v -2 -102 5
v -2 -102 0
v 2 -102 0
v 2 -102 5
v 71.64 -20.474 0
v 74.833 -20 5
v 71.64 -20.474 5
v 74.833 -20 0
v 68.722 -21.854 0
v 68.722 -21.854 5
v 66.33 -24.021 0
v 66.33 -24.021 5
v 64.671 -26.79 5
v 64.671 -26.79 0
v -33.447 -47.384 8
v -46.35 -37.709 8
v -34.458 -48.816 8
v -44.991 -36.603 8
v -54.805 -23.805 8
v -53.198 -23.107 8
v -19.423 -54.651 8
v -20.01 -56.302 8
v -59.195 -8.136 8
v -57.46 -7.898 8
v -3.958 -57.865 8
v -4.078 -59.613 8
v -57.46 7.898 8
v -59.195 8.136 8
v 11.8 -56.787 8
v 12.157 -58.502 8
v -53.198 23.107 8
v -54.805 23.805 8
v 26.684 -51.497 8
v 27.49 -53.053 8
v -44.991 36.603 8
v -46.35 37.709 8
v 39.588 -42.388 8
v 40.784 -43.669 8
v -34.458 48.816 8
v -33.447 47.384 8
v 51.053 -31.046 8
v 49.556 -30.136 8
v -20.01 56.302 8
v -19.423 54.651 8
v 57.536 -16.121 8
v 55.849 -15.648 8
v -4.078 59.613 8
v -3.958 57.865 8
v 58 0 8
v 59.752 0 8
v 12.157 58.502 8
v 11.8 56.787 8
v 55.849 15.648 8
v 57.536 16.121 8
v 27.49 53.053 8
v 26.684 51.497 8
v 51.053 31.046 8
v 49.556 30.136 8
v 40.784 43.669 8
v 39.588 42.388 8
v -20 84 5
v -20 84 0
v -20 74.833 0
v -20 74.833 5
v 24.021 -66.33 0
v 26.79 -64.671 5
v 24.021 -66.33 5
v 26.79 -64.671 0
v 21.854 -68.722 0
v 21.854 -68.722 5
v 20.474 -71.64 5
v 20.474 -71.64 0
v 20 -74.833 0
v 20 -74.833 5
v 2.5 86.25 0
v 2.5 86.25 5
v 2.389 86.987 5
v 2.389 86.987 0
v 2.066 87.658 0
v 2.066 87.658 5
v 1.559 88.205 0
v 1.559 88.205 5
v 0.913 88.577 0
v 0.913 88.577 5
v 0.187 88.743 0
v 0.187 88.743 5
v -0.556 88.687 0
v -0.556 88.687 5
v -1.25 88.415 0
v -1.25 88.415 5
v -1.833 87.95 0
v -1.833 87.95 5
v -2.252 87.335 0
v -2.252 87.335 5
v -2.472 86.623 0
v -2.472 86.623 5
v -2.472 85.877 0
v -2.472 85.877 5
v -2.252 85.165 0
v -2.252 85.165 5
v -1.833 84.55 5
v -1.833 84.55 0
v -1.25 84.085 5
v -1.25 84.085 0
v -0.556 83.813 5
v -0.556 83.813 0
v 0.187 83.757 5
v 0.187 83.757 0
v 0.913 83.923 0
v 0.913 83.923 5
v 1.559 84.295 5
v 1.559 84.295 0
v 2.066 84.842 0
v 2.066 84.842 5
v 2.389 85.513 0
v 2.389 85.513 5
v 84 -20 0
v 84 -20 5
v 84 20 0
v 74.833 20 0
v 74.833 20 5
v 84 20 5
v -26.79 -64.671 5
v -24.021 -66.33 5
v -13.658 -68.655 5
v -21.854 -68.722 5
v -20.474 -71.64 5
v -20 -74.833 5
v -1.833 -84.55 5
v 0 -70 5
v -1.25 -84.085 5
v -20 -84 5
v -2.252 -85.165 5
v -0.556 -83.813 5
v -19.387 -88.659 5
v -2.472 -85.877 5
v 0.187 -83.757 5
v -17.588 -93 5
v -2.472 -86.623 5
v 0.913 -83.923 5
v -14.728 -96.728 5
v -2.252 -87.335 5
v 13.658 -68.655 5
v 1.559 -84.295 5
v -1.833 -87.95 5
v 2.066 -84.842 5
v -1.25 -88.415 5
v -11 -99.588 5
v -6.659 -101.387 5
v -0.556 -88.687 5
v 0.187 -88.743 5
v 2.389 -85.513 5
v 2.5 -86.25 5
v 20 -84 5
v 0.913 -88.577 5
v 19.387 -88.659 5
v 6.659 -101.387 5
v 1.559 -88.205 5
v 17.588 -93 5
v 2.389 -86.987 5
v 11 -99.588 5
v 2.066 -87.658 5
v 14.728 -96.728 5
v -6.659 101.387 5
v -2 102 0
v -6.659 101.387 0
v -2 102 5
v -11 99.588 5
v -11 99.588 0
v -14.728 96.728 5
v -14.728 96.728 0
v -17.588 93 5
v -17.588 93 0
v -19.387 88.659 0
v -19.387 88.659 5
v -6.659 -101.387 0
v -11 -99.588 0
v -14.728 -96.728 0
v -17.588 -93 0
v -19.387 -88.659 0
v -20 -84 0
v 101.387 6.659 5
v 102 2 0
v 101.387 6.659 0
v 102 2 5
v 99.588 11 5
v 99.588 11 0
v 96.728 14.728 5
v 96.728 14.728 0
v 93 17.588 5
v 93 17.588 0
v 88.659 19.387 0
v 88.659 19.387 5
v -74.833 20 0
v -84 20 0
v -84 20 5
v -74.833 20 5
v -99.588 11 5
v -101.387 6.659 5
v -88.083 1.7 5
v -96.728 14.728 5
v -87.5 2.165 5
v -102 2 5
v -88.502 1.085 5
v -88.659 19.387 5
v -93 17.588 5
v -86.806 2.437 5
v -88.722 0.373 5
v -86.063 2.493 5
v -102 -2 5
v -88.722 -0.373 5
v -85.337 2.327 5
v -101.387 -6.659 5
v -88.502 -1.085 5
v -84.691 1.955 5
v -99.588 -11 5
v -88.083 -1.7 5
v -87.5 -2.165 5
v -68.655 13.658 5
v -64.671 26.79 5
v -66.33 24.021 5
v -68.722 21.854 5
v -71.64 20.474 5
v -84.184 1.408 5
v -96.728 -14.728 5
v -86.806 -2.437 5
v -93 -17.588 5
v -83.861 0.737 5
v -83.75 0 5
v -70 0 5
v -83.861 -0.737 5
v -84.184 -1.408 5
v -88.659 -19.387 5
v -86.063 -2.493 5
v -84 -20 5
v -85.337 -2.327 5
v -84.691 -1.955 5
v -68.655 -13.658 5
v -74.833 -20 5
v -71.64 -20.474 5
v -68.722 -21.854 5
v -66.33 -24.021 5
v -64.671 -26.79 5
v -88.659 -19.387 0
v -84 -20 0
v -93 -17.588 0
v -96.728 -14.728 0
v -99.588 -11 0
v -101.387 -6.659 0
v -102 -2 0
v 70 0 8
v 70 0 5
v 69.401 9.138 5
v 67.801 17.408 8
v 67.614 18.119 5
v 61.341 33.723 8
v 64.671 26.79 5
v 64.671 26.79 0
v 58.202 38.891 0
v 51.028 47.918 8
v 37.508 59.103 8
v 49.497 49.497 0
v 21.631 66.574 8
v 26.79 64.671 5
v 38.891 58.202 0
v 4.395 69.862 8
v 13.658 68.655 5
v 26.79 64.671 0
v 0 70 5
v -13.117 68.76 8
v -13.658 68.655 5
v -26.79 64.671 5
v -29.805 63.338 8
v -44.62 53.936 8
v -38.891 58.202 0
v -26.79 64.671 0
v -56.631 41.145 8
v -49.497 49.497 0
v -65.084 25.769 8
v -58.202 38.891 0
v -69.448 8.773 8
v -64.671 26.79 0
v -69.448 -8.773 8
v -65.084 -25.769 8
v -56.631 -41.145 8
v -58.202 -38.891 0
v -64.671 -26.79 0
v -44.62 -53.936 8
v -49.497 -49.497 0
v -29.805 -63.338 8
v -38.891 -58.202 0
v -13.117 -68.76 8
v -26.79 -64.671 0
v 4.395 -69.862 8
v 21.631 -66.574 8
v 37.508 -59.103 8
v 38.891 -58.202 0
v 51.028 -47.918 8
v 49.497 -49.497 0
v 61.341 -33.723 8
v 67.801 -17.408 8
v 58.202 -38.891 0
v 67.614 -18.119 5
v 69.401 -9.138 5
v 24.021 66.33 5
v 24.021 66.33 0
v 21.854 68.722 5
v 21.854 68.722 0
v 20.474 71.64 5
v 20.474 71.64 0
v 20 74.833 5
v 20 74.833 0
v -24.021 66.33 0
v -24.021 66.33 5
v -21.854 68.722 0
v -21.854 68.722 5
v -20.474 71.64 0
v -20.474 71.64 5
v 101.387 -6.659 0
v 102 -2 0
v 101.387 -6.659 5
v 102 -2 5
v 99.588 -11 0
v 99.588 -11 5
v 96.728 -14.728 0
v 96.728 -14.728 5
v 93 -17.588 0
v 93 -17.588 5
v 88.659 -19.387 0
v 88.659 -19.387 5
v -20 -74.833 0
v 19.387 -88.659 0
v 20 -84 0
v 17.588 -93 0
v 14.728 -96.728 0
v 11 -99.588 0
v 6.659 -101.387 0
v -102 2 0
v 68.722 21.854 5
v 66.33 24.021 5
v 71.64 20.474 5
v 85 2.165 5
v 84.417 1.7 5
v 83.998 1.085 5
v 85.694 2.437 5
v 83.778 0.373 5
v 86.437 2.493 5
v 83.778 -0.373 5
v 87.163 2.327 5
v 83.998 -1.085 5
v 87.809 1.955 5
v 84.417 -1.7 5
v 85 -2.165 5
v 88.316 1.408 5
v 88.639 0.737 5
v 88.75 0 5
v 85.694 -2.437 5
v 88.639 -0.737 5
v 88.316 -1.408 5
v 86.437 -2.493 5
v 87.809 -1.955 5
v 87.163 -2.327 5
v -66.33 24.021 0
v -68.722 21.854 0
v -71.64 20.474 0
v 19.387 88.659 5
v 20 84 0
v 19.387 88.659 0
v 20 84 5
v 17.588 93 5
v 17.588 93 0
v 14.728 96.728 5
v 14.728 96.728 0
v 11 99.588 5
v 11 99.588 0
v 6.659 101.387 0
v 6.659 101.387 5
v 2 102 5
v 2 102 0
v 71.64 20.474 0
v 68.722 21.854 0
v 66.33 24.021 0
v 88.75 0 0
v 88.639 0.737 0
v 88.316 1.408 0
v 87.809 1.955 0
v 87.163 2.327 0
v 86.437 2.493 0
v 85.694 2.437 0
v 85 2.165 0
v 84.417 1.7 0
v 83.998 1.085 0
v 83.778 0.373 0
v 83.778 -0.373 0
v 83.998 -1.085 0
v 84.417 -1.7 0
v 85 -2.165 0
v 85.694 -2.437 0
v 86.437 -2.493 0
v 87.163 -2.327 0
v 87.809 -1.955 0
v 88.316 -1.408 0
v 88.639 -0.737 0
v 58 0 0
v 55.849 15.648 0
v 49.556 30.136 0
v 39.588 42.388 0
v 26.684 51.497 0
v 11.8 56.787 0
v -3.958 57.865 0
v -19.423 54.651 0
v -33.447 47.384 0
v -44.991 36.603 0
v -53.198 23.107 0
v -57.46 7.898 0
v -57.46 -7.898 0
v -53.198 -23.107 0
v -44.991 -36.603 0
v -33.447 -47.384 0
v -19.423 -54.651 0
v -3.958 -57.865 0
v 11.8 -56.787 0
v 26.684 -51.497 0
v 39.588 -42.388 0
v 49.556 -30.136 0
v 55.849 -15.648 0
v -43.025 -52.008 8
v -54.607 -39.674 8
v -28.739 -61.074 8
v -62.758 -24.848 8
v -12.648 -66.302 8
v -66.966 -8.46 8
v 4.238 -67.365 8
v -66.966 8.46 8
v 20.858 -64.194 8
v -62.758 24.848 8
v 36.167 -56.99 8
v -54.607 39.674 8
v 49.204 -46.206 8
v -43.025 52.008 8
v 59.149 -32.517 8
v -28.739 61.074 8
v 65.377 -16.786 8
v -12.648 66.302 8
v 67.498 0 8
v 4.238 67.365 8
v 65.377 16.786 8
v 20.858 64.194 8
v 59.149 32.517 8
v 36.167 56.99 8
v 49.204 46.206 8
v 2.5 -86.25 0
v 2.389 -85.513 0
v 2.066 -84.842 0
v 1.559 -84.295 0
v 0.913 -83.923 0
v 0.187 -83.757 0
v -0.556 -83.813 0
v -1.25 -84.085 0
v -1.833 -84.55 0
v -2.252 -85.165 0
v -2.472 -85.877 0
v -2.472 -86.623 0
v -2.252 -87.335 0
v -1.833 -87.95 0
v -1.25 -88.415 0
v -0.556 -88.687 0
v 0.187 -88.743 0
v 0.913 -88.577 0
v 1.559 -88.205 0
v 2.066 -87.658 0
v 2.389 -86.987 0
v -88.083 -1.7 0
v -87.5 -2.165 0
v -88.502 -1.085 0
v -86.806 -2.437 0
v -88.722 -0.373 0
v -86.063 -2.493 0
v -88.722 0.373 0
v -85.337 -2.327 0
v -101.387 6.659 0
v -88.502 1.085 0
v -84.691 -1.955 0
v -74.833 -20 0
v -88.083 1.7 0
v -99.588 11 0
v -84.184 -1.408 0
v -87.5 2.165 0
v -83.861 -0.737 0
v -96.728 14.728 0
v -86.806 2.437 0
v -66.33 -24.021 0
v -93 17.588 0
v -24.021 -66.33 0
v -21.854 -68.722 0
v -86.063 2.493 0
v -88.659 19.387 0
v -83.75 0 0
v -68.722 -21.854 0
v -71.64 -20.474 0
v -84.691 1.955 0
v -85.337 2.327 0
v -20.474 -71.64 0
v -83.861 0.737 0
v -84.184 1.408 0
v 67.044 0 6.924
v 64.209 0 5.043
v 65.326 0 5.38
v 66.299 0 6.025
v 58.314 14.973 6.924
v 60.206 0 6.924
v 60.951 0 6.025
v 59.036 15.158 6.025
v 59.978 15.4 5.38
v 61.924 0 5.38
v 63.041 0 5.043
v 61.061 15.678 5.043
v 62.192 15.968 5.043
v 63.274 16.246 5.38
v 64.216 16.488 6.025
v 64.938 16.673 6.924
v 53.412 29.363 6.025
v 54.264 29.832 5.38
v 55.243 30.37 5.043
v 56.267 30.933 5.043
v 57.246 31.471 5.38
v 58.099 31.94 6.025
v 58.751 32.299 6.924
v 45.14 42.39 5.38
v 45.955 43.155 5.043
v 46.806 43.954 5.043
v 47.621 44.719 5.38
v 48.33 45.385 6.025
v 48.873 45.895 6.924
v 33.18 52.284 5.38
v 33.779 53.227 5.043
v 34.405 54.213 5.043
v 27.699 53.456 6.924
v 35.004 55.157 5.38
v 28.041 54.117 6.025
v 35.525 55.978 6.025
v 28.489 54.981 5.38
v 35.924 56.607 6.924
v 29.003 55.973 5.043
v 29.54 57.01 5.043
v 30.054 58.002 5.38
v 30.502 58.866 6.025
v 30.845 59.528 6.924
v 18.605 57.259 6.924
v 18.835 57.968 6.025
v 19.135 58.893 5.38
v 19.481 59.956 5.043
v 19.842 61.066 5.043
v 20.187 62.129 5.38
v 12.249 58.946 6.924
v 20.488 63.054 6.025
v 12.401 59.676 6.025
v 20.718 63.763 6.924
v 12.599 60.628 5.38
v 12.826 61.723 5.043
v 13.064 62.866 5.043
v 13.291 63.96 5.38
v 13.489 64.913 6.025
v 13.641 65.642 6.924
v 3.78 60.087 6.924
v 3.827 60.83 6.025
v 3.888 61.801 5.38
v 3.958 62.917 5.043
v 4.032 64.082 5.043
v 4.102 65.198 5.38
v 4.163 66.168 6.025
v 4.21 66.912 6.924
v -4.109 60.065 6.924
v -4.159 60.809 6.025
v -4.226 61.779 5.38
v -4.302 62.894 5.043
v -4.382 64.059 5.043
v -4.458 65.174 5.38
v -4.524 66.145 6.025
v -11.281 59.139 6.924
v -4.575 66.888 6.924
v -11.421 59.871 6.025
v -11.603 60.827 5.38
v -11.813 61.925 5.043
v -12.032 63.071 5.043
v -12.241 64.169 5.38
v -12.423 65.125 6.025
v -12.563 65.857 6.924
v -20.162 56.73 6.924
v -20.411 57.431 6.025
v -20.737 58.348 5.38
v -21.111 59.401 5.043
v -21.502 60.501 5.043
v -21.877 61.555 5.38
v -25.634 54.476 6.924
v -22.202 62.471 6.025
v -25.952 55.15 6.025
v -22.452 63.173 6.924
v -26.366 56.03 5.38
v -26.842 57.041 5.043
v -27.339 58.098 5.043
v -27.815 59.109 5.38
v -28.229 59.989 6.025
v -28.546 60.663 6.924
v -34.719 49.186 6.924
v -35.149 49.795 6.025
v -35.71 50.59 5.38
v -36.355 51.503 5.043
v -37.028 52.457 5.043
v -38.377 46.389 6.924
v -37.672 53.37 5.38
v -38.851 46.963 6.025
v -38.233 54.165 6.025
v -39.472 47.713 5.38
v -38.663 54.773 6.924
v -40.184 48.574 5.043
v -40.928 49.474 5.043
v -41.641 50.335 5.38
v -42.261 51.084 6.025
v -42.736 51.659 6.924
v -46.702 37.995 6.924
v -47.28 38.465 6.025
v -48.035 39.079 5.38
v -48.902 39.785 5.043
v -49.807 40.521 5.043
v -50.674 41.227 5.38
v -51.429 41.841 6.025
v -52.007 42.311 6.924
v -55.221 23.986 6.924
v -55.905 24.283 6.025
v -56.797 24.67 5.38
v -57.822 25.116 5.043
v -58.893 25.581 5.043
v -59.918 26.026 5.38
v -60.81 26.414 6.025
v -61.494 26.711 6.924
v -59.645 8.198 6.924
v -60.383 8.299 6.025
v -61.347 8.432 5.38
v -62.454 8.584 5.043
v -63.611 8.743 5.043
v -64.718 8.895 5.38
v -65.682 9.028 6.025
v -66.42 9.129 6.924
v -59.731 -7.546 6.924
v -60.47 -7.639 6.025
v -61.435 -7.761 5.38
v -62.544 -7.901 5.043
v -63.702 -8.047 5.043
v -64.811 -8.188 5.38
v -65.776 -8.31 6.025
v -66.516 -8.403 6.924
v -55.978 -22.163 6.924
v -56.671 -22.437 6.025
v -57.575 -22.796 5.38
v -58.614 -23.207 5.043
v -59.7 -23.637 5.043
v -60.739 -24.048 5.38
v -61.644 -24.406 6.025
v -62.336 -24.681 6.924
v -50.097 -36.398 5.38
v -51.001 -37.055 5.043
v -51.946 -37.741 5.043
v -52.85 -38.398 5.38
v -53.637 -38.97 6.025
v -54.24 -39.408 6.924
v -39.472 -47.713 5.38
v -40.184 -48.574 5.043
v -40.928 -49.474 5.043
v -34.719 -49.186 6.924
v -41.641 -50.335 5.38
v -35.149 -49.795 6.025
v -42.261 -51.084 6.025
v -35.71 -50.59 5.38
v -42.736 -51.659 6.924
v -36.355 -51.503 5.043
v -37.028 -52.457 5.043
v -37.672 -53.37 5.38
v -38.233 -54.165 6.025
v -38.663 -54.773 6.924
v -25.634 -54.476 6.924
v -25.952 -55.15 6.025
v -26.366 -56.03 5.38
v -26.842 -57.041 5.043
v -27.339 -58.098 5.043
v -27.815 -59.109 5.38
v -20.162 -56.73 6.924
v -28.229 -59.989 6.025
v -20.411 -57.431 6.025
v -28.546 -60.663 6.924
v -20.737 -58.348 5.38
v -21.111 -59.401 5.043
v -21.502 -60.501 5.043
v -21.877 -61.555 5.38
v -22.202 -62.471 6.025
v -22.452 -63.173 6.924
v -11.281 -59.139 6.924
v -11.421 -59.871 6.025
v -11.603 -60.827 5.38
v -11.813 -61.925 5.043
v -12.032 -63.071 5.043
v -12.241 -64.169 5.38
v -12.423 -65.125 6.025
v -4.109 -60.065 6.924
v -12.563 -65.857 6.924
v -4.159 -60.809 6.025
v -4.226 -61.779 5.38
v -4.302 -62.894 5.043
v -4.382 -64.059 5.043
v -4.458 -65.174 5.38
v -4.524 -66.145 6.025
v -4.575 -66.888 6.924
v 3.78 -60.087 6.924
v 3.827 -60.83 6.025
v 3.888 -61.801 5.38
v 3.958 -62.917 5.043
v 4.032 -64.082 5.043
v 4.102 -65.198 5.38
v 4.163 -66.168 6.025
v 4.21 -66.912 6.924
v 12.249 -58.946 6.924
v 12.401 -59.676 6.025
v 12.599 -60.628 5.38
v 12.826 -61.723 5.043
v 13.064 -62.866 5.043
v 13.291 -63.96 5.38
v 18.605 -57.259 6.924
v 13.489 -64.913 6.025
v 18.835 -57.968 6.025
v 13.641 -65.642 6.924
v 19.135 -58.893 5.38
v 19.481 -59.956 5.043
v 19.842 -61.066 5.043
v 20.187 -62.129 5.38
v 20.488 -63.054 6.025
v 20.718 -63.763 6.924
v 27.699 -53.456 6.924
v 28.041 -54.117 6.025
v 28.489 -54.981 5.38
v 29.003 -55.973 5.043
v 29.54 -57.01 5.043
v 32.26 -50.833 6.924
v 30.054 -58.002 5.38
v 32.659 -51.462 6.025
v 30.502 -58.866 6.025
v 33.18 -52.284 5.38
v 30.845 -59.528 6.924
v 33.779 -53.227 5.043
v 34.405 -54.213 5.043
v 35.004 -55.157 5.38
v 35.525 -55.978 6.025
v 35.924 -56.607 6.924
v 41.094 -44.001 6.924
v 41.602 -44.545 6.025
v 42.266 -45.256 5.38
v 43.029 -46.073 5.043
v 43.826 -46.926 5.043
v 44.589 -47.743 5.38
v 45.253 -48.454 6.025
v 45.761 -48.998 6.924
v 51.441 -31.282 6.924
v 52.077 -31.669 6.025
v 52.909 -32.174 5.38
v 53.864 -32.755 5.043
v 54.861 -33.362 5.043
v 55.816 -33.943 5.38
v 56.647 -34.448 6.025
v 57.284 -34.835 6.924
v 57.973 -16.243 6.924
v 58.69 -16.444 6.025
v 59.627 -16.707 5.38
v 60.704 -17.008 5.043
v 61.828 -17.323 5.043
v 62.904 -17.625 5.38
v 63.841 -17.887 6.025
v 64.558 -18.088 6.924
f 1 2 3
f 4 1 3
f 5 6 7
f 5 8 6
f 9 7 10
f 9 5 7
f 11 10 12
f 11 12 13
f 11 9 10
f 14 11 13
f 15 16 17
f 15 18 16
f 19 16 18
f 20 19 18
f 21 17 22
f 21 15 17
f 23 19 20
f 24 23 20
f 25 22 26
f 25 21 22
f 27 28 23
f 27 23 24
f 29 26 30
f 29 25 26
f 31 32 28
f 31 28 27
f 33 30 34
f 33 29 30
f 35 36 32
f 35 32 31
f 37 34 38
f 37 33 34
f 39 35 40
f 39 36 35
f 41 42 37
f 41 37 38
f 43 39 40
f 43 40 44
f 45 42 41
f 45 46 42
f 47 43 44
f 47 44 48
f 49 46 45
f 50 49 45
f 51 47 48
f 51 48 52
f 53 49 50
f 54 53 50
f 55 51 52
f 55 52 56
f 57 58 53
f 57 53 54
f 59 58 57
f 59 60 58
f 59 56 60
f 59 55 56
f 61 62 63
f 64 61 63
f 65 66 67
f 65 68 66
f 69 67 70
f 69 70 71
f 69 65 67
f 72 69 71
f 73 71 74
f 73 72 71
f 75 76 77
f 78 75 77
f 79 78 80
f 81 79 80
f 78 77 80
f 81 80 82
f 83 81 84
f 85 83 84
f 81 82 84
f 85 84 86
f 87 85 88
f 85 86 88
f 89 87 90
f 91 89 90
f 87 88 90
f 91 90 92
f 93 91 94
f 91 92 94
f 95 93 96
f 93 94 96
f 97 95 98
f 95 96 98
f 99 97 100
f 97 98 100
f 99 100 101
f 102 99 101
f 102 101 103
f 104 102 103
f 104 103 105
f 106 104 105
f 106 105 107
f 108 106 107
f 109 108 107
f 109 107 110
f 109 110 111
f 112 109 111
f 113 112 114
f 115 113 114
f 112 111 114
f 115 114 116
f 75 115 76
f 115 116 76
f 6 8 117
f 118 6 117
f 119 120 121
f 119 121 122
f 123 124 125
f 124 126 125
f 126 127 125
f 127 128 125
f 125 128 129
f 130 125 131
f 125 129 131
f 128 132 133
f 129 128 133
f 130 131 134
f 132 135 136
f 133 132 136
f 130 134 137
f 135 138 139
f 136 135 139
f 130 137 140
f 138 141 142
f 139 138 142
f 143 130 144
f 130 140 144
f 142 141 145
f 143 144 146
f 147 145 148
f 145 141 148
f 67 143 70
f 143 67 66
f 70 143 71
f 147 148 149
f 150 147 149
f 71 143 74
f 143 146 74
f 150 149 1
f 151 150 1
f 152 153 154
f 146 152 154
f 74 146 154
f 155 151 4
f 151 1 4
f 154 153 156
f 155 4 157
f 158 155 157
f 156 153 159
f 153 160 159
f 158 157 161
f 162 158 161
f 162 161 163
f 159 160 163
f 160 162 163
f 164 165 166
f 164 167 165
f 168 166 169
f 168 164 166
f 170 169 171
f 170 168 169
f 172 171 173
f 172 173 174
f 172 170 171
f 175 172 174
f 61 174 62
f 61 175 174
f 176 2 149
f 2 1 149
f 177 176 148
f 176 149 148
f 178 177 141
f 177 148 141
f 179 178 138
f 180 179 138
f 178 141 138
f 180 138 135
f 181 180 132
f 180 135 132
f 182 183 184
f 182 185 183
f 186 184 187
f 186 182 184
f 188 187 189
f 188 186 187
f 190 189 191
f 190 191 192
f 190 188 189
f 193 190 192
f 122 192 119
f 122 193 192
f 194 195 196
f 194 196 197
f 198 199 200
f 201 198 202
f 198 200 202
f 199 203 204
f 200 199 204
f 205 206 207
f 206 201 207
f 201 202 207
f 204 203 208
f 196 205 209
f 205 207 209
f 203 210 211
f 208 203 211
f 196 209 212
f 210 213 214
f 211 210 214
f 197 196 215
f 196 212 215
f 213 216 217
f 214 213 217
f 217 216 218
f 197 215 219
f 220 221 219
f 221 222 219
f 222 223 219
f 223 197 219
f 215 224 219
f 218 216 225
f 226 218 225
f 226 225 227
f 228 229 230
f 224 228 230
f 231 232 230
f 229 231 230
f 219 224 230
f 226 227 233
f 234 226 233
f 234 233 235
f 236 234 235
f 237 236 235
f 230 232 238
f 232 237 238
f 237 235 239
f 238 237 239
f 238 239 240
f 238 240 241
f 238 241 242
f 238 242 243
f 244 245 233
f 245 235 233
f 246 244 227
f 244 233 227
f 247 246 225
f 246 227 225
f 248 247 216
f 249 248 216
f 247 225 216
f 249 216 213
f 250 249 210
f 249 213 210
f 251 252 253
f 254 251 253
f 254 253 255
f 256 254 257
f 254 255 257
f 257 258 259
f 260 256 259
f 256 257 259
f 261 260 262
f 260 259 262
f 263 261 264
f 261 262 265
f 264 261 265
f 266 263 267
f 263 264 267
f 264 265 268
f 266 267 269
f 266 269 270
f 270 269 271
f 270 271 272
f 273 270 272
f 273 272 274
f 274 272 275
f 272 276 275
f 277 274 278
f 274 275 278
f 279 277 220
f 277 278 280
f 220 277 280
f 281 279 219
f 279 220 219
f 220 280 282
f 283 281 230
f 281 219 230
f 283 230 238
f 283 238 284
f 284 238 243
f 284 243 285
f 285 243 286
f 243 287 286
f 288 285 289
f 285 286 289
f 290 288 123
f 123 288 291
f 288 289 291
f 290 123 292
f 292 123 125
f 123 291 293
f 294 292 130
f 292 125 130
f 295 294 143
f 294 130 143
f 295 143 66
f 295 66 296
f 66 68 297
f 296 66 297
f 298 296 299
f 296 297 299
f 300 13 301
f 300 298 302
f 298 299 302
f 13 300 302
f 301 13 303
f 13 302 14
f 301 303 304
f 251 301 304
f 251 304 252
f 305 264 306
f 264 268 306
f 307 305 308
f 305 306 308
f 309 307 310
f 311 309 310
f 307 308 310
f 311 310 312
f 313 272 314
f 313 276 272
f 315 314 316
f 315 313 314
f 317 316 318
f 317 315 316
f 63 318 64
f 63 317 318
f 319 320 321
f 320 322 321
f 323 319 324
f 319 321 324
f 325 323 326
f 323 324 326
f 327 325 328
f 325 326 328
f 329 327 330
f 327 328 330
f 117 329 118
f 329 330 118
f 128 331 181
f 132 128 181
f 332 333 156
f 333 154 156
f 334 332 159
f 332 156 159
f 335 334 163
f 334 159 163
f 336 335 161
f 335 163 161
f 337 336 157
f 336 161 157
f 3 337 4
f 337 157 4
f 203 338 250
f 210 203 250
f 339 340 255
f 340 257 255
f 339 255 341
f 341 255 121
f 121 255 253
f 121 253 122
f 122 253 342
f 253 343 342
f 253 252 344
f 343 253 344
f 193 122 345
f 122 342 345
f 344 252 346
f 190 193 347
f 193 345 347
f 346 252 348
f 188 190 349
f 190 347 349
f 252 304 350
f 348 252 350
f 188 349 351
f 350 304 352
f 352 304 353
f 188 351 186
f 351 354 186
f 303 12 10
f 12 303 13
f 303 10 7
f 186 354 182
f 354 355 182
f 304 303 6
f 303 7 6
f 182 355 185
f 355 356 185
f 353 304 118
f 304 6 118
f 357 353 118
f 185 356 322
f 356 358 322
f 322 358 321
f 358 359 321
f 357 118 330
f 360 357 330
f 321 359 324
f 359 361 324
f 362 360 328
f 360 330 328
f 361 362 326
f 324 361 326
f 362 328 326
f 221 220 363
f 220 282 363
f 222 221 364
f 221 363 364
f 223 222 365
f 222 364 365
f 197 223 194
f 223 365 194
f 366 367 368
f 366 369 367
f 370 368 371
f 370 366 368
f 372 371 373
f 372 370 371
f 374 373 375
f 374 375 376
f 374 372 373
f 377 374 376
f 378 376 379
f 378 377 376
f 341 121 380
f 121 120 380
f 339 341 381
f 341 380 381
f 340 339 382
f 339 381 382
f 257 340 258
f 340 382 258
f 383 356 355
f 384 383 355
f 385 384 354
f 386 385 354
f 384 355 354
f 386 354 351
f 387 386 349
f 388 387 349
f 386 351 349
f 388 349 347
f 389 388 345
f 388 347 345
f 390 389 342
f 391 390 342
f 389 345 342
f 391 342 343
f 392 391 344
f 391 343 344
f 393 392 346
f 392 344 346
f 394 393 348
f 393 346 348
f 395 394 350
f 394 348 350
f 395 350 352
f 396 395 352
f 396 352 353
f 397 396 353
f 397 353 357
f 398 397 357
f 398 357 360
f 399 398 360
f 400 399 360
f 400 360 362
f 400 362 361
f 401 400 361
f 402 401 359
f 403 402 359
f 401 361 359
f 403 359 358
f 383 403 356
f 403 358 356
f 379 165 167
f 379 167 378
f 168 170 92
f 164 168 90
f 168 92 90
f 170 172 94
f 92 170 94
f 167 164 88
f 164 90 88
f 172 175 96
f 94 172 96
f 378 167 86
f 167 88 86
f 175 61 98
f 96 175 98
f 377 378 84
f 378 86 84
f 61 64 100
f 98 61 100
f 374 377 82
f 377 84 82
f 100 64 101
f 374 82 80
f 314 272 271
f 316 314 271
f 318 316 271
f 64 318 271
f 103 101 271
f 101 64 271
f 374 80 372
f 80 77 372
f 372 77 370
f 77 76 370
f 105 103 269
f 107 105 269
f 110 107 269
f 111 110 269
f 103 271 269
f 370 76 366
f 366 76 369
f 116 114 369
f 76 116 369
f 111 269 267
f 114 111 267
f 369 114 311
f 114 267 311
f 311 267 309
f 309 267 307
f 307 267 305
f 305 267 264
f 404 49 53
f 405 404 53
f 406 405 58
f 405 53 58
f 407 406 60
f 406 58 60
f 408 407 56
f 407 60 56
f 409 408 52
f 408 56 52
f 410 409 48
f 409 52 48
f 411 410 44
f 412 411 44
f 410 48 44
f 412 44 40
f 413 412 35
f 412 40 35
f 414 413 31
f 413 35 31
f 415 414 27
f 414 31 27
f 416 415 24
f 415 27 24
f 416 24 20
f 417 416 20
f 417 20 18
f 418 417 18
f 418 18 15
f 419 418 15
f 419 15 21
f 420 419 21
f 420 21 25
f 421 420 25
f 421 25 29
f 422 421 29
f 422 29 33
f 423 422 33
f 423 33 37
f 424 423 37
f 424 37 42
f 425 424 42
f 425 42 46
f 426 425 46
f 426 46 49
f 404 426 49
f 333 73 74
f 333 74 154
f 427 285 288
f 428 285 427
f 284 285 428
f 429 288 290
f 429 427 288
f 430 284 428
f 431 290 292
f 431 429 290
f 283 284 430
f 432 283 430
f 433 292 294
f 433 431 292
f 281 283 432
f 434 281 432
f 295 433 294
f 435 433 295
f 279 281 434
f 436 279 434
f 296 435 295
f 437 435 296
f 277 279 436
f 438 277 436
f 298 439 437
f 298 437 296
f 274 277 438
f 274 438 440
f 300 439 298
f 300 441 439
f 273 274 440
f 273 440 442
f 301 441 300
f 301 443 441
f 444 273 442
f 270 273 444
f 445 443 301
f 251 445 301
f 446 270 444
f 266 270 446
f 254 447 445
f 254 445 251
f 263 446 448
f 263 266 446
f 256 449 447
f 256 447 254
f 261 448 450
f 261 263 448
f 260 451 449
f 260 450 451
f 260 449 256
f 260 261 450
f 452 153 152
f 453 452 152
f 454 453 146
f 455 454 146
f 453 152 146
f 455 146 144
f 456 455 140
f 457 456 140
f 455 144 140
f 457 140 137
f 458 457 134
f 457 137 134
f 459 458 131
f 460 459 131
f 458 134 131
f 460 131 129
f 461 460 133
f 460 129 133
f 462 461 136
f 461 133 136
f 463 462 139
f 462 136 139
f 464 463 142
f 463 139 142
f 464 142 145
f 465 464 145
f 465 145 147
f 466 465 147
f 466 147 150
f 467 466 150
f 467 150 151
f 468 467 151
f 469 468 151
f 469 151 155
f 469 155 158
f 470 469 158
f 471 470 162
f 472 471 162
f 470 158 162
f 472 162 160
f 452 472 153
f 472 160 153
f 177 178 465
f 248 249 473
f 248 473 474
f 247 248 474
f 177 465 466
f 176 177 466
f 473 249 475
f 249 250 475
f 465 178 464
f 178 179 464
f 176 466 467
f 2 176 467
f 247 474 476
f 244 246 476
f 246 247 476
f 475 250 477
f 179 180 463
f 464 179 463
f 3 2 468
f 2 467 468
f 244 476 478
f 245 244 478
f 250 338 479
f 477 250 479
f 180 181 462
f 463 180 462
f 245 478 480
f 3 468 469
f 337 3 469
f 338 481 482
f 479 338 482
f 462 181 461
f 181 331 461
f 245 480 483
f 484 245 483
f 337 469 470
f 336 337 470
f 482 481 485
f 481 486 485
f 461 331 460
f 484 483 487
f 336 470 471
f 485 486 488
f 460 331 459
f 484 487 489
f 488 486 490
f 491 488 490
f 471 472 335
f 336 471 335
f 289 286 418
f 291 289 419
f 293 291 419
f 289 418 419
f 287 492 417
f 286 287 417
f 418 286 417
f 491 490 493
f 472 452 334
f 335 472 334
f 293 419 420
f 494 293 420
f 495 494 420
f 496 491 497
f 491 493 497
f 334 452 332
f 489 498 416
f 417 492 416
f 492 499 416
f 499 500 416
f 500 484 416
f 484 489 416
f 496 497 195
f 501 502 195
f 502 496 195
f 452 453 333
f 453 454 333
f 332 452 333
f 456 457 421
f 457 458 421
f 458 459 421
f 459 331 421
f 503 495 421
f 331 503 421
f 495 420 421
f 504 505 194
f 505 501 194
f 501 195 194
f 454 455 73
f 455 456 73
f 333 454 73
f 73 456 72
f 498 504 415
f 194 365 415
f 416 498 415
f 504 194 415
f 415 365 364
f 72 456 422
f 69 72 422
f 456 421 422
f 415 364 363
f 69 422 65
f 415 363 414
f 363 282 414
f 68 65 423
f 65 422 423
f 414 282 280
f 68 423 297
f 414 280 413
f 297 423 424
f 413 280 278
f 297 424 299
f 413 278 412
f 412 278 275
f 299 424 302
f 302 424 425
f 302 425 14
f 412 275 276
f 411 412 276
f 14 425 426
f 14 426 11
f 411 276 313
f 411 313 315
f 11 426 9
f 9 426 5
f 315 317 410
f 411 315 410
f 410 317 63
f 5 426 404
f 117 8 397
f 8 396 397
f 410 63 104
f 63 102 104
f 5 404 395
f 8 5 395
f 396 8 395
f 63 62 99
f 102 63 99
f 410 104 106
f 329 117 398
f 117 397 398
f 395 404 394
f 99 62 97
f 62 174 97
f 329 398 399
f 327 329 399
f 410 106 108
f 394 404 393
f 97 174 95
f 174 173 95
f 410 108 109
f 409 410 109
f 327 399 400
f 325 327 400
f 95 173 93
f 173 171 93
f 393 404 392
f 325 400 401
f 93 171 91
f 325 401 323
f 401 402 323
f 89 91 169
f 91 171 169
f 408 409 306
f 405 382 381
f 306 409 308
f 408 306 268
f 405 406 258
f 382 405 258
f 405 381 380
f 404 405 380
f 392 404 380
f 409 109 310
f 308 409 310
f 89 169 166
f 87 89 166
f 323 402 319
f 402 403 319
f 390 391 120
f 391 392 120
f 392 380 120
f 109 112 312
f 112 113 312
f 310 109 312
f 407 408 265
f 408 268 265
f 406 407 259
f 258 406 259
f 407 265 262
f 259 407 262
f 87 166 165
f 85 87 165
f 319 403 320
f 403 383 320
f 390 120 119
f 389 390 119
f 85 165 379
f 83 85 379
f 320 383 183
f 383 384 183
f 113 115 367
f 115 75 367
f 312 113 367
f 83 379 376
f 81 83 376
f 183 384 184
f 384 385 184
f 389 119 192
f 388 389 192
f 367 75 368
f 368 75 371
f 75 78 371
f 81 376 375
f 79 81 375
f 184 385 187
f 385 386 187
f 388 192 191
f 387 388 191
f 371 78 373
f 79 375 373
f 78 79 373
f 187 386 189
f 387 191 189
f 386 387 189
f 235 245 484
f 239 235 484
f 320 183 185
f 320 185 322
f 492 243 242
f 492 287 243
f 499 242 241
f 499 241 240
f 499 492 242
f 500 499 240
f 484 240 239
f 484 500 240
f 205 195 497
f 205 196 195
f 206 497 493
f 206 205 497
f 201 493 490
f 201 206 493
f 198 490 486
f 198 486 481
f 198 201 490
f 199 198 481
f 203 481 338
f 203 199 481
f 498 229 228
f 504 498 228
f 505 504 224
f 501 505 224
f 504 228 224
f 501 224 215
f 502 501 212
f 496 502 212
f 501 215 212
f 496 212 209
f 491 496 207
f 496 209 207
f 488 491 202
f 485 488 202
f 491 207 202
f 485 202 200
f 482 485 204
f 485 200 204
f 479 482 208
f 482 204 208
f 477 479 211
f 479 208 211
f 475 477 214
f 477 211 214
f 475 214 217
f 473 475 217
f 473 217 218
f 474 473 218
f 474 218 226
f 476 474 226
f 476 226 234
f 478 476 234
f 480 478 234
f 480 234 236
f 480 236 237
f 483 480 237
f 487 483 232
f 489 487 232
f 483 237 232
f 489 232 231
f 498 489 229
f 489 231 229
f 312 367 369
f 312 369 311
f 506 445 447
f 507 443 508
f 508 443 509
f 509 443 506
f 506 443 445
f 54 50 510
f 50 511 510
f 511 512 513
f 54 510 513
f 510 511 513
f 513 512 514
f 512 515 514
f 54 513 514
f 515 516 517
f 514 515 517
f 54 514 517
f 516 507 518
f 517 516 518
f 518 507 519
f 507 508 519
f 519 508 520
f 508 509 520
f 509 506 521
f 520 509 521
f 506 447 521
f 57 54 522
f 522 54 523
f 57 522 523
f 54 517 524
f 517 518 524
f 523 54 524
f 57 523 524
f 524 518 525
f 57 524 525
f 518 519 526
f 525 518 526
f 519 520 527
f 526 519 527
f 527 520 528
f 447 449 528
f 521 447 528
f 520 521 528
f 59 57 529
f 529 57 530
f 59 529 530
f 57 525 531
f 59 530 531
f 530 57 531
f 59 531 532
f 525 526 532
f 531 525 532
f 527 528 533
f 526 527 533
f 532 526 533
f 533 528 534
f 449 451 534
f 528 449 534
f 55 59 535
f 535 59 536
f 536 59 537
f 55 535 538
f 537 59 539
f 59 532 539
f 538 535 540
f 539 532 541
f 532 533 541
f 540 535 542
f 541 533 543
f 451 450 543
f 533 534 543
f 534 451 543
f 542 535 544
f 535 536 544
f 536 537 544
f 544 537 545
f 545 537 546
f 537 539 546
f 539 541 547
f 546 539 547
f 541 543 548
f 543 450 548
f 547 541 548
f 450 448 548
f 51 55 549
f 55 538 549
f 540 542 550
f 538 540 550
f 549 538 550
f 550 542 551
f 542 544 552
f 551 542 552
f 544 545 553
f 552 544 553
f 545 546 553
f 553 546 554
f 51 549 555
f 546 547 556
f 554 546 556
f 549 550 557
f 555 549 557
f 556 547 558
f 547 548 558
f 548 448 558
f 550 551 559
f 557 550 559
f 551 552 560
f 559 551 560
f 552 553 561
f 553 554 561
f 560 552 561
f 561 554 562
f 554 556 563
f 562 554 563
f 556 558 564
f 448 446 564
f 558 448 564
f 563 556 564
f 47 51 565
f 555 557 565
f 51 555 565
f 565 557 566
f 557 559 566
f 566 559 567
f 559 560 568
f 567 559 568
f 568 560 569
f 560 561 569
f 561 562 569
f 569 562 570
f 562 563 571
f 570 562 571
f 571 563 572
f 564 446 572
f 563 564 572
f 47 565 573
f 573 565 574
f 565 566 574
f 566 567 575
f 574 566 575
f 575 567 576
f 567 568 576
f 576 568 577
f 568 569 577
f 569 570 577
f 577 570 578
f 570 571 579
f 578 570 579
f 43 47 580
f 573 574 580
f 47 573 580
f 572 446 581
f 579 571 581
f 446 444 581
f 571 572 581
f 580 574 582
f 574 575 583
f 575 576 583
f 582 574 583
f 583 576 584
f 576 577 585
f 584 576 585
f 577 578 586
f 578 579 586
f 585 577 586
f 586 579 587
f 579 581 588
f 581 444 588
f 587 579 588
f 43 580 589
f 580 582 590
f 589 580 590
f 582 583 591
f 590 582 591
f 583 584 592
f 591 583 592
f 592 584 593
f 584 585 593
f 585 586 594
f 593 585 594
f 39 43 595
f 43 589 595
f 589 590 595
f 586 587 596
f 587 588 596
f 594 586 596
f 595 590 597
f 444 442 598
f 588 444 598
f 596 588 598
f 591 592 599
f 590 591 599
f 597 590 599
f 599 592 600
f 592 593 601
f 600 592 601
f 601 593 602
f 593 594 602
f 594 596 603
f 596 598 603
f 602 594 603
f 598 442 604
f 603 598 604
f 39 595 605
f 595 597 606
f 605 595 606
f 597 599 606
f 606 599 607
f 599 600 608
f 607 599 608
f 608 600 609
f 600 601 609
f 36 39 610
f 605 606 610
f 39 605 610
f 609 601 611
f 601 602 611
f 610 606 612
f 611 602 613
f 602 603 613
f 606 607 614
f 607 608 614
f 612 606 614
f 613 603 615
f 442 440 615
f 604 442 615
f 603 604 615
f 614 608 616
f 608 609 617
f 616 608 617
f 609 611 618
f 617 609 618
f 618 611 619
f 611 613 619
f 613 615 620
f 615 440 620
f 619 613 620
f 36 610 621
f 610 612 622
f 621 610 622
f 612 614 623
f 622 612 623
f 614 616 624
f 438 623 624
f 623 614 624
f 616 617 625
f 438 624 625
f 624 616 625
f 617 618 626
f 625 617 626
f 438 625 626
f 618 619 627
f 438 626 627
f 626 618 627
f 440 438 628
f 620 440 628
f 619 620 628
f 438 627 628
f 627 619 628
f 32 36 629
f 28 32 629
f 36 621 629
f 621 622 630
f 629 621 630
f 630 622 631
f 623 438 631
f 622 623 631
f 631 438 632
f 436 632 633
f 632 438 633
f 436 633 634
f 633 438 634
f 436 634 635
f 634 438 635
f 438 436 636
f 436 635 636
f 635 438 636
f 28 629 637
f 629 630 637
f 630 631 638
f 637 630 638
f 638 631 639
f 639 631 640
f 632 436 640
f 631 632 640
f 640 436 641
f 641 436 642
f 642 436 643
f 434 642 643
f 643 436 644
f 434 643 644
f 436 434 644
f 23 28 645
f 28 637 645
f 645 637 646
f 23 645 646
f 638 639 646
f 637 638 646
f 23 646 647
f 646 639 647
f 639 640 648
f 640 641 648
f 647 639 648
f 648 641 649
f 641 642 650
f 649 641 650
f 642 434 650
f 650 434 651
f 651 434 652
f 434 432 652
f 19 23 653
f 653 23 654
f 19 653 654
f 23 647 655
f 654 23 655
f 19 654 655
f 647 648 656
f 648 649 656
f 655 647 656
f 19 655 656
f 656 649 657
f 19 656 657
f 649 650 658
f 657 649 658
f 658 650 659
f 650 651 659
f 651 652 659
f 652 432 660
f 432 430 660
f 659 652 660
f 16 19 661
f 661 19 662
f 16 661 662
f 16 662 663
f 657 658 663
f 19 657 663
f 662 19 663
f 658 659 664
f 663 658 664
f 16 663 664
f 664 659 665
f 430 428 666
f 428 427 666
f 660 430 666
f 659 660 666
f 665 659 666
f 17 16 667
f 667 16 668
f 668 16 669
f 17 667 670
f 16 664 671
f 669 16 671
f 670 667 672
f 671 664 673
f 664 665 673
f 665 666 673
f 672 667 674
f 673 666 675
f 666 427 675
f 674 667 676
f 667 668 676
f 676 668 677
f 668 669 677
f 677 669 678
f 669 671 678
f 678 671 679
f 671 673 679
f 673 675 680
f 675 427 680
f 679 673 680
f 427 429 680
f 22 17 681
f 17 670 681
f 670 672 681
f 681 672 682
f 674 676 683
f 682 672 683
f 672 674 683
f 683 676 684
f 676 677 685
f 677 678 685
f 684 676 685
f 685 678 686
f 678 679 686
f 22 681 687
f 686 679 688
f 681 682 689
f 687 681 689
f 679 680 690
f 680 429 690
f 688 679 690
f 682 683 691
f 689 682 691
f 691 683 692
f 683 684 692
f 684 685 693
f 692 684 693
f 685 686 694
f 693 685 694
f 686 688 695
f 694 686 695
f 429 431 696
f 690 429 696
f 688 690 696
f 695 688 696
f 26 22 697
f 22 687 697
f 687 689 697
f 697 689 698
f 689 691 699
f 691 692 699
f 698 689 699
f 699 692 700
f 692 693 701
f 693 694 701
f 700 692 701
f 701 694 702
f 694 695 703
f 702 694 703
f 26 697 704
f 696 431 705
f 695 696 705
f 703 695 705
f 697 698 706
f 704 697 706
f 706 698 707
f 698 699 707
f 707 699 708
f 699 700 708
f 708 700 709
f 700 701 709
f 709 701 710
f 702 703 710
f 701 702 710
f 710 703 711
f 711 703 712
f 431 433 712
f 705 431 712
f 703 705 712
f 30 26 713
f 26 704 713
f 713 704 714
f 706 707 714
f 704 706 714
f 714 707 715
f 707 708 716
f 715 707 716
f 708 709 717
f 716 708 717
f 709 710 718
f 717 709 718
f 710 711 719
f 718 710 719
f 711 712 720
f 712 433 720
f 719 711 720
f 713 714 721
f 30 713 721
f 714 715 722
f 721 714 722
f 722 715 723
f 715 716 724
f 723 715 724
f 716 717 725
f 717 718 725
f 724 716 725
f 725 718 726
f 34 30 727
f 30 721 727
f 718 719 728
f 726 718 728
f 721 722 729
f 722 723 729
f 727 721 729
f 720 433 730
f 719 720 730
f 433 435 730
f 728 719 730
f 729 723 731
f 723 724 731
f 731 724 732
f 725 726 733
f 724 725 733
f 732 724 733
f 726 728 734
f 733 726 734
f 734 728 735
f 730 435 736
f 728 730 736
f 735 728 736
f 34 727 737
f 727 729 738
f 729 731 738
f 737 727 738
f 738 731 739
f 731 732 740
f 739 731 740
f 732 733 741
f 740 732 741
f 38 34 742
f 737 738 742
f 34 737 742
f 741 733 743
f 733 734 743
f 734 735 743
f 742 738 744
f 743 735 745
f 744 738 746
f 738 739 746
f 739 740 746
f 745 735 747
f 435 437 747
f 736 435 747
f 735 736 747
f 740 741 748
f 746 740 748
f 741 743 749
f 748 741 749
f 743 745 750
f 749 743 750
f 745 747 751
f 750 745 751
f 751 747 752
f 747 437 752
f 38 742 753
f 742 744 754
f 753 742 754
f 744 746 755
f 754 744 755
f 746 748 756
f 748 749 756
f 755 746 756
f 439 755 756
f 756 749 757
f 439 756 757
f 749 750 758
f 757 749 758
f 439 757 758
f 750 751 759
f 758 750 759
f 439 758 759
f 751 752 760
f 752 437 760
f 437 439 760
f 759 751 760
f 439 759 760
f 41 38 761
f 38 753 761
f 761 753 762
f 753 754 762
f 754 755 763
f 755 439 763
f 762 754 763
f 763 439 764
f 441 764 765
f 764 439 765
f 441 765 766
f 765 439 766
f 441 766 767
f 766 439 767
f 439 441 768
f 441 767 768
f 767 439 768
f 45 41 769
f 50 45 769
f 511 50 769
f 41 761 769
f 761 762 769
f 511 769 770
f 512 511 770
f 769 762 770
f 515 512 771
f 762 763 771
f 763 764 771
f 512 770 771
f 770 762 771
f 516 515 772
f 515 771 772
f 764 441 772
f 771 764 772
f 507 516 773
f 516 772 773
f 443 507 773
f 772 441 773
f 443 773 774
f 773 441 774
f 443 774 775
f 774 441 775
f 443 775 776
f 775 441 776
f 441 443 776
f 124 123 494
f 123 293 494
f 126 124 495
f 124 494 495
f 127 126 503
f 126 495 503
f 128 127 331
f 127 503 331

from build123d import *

# Parameters (mm, degrees)
SKETCH_R        = 70
SKETCH_R_2      = 57.25
PAD_DEPTH       = 15
SKETCH001_R     = 4
SKETCH002_W     = 40
SKETCH002_H     = 40
PAD001_DEPTH    = 5
SKETCH003_R     = 2.5
POCKET_DEPTH    = 5
FILLET_R        = 18
FILLET001_R     = 11
SKETCH004_R     = 58
POCKET001_DEPTH = 15.001
SKETCH005_R     = 71
POCKET002_DEPTH = 7
SKETCH006_R     = 4


with BuildPart() as part:
    # Sketch → Pad (new body)
    with BuildSketch(Plane.XY):
        Circle(SKETCH_R)
        Circle(SKETCH_R_2, mode=Mode.SUBTRACT)
    extrude(amount=PAD_DEPTH)

    # Sketch001 → Groove (revolve, cut)
    with BuildSketch(Plane.XZ):
        with Locations((63.625, 16)):
            Circle(SKETCH001_R)
    revolve(axis=Axis((0, 0, 0), (0, 0, 1)), mode=Mode.SUBTRACT)

    # Sketch002 (on Face2 of Groove) → Pad001 (join)
    with BuildSketch(Plane(origin=(0, 0, 0), x_dir=(1, 0, 0), z_dir=(0, 0, -1))):
        with Locations((82, 0)):
            Rectangle(SKETCH002_W, SKETCH002_H)
        with Locations((-82, 0)):
            Rectangle(SKETCH002_W, SKETCH002_H)
        with Locations((0, 82)):
            Rectangle(SKETCH002_W, SKETCH002_H)
        with Locations((0, -82)):
            Rectangle(SKETCH002_W, SKETCH002_H)
    extrude(amount=-PAD001_DEPTH)

    # Sketch003 (on Face13 of Pad001) → Pocket (cut)
    with BuildSketch(Plane.XY.offset(5)):
        with Locations((-86.25, 0)):
            Circle(SKETCH003_R)
        with Locations((0, -86.25)):
            Circle(SKETCH003_R)
        with Locations((86.25, 0)):
            Circle(SKETCH003_R)
        with Locations((0, 86.25)):
            Circle(SKETCH003_R)
    extrude(amount=-POCKET_DEPTH, mode=Mode.SUBTRACT)

    # Fillet
    fillet_edges = [part.edges().sort_by_distance(p)[0] for p in [
        (-20, 102, 2.5),
        (20, 102, 2.5),
        (102, 20, 2.5),
        (102, -20, 2.5),
        (20, -102, 2.5),
        (-20, -102, 2.5),
        (-102, -20, 2.5),
        (-102, 20, 2.5),
    ]]
    fillet(fillet_edges, radius=FILLET_R)

    # Fillet001
    fillet001_edges = [part.edges().sort_by_distance(p)[0] for p in [
        (67.082039, 20, 2.5),
        (20, 67.082039, 2.5),
        (-20, 67.082039, 2.5),
        (-67.082039, 20, 2.5),
        (-67.082039, -20, 2.5),
        (-20, -67.082039, 2.5),
        (20, -67.082039, 2.5),
        (67.082039, -20, 2.5),
    ]]
    fillet(fillet001_edges, radius=FILLET001_R)

    # Sketch004 (on Face41 of Fillet001) → Pocket001 (cut, through all)
    with BuildSketch(Plane.XY.offset(15)):
        Circle(SKETCH004_R)
    extrude(amount=-POCKET001_DEPTH, mode=Mode.SUBTRACT)

    # Sketch005 (on Face38 of Pocket001) → Pocket002 (cut)
    with BuildSketch(Plane.XY.offset(15)):
        Circle(SKETCH005_R)
    extrude(amount=-POCKET002_DEPTH, mode=Mode.SUBTRACT)

    # Sketch006 → Groove001 (revolve, cut)
    with BuildSketch(Plane.XZ):
        with Locations((63.625, 9)):
            Circle(SKETCH006_R)
    revolve(axis=Axis((0, 0, 0), (0, 0, 1)), mode=Mode.SUBTRACT)


solid = part.part
